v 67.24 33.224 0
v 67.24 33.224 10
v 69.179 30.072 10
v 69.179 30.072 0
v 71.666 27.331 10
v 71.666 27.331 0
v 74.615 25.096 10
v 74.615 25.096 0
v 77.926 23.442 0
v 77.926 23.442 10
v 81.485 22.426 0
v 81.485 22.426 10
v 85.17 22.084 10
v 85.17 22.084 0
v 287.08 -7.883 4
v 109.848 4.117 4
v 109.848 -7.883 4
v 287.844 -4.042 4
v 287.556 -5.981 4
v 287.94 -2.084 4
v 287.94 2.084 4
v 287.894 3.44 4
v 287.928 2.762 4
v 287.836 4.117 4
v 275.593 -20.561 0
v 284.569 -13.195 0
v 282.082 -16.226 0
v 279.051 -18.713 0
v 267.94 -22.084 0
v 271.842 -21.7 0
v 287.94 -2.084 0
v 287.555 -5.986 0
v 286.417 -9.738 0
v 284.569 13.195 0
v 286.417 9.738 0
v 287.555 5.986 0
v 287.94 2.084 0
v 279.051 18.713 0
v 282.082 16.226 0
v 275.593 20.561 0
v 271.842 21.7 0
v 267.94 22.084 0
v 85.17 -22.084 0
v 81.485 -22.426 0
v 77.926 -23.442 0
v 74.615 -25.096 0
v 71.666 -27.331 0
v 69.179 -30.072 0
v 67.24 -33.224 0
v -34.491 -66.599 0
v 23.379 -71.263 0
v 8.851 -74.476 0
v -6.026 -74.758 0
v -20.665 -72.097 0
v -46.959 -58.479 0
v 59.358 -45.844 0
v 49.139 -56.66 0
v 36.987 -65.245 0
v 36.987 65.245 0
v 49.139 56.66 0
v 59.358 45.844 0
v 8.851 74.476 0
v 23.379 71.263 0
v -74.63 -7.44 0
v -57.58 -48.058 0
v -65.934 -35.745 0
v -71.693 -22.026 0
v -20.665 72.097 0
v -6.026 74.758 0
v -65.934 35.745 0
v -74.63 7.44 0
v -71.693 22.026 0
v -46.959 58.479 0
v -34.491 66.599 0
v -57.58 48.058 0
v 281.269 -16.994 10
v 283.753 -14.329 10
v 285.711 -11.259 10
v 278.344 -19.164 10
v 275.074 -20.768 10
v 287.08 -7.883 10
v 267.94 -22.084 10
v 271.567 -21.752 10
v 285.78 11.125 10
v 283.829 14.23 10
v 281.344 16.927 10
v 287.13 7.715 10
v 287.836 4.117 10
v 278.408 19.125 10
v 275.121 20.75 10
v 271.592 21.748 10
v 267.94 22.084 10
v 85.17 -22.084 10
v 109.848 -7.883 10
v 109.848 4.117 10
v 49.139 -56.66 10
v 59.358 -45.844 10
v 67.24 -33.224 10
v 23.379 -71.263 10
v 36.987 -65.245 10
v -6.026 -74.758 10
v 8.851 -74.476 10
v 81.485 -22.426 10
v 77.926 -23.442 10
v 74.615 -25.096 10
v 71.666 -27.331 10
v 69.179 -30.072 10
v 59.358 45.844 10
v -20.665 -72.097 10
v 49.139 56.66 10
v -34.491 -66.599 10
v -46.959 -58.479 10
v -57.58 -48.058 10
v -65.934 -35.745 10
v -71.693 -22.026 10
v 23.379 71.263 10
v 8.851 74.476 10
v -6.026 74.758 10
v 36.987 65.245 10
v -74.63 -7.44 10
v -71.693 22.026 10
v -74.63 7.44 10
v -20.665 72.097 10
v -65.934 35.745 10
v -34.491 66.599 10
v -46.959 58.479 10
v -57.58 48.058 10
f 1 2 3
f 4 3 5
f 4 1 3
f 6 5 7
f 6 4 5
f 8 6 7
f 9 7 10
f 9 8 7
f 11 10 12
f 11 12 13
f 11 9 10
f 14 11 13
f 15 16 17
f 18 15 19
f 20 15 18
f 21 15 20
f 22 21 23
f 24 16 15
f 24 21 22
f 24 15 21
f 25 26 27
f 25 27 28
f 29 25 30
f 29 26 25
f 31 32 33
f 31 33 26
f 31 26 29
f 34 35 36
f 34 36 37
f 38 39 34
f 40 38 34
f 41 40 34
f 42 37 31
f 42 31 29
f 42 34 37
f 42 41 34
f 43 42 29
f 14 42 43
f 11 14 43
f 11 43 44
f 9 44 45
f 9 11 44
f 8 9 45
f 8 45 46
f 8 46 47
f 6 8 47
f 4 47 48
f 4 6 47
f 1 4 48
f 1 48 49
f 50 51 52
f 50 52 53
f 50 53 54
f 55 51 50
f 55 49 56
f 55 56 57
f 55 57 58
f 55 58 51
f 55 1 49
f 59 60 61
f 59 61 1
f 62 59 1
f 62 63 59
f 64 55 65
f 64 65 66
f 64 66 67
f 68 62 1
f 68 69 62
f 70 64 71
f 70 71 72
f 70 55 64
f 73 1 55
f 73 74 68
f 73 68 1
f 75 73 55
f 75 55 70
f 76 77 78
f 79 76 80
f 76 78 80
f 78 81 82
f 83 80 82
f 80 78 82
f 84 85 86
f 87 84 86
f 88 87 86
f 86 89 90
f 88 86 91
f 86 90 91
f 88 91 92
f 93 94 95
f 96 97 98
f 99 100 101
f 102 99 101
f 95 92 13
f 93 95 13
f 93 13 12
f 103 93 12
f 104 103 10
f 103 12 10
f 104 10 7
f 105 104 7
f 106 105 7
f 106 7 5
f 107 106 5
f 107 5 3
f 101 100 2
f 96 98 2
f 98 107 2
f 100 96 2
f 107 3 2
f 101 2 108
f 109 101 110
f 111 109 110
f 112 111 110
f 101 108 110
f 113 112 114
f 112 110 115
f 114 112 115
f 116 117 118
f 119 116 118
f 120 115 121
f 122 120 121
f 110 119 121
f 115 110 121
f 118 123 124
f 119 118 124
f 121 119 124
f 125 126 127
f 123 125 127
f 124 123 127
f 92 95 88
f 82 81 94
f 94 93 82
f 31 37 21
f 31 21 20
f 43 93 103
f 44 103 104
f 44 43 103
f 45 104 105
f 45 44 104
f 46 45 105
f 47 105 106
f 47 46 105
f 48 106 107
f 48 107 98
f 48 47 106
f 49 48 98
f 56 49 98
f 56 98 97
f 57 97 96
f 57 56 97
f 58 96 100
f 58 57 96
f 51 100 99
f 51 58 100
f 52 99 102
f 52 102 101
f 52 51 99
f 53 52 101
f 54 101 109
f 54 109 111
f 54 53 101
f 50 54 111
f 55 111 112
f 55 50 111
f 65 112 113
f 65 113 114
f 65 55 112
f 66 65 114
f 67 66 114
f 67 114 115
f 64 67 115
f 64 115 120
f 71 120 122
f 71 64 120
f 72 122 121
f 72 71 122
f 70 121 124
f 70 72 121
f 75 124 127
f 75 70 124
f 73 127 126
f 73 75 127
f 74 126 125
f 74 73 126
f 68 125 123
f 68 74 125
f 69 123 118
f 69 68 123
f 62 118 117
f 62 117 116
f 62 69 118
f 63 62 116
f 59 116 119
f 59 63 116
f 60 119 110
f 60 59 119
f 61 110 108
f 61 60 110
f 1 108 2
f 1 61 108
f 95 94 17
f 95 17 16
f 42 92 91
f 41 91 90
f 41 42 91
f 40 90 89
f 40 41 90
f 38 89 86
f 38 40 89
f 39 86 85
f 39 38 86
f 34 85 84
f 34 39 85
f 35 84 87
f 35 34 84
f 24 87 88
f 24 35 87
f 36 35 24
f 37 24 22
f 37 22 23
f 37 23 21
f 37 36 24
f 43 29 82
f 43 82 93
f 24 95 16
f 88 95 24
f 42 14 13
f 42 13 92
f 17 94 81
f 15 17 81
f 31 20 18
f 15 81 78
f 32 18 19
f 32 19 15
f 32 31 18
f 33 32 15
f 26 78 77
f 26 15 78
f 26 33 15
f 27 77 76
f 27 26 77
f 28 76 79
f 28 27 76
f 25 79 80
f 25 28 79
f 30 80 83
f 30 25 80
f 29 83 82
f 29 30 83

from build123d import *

# Parameters (mm, degrees)
BOSS_EXTRUDE1_DEPTH = 10
SKETCH2_W           = 168.929390661
SKETCH2_H           = 12
CUT_EXTRUDE1_DEPTH  = 6
SKETCH3_W           = 79.959911579
SKETCH3_H           = 12
CUT_EXTRUDE2_DEPTH  = 6


with BuildPart() as part:
    # Sketch1 → Boss-Extrude1 (new body)
    with BuildSketch(Plane.XY):
        with BuildLine():
            Line((85.170110947, 22.083871035), (267.939703111, 22.083871035))
            ThreePointArc((267.939703111, 22.083871035), (282.081838735, 16.226006659), (287.939703111, 2.083871035))
            Line((287.939703111, 2.083871035), (287.939703111, -2.083871035))
            ThreePointArc((287.939703111, -2.083871035), (282.081838735, -16.226006659), (267.939703111, -22.083871035))
            Line((267.939703111, -22.083871035), (85.170110947, -22.083871035))
            ThreePointArc((85.170110947, -22.083871035), (74.615378512, -25.095709768), (67.239561274, -33.224108712))
            ThreePointArc((67.239561274, -33.224108712), (-75, 0), (67.239561274, 33.224108712))
            ThreePointArc((67.239561274, 33.224108712), (74.615378512, 25.095709768), (85.170110947, 22.083871035))
        make_face()
    extrude(amount=BOSS_EXTRUDE1_DEPTH)

    # Sketch2 → Cut-Extrude1 (cut)
    with BuildSketch(Plane.XY.offset(10)):
        with Locations((194.3131347, -1.883371564)):
            Rectangle(SKETCH2_W, SKETCH2_H)
    extrude(amount=-CUT_EXTRUDE1_DEPTH, mode=Mode.SUBTRACT)

    # Sketch3 → Cut-Extrude2 (cut)
    with BuildSketch(Plane.XY.offset(10)):
        with Locations((318.757785819, -1.883371564)):
            Rectangle(SKETCH3_W, SKETCH3_H)
    extrude(amount=-CUT_EXTRUDE2_DEPTH, mode=Mode.SUBTRACT)


solid = part.part
